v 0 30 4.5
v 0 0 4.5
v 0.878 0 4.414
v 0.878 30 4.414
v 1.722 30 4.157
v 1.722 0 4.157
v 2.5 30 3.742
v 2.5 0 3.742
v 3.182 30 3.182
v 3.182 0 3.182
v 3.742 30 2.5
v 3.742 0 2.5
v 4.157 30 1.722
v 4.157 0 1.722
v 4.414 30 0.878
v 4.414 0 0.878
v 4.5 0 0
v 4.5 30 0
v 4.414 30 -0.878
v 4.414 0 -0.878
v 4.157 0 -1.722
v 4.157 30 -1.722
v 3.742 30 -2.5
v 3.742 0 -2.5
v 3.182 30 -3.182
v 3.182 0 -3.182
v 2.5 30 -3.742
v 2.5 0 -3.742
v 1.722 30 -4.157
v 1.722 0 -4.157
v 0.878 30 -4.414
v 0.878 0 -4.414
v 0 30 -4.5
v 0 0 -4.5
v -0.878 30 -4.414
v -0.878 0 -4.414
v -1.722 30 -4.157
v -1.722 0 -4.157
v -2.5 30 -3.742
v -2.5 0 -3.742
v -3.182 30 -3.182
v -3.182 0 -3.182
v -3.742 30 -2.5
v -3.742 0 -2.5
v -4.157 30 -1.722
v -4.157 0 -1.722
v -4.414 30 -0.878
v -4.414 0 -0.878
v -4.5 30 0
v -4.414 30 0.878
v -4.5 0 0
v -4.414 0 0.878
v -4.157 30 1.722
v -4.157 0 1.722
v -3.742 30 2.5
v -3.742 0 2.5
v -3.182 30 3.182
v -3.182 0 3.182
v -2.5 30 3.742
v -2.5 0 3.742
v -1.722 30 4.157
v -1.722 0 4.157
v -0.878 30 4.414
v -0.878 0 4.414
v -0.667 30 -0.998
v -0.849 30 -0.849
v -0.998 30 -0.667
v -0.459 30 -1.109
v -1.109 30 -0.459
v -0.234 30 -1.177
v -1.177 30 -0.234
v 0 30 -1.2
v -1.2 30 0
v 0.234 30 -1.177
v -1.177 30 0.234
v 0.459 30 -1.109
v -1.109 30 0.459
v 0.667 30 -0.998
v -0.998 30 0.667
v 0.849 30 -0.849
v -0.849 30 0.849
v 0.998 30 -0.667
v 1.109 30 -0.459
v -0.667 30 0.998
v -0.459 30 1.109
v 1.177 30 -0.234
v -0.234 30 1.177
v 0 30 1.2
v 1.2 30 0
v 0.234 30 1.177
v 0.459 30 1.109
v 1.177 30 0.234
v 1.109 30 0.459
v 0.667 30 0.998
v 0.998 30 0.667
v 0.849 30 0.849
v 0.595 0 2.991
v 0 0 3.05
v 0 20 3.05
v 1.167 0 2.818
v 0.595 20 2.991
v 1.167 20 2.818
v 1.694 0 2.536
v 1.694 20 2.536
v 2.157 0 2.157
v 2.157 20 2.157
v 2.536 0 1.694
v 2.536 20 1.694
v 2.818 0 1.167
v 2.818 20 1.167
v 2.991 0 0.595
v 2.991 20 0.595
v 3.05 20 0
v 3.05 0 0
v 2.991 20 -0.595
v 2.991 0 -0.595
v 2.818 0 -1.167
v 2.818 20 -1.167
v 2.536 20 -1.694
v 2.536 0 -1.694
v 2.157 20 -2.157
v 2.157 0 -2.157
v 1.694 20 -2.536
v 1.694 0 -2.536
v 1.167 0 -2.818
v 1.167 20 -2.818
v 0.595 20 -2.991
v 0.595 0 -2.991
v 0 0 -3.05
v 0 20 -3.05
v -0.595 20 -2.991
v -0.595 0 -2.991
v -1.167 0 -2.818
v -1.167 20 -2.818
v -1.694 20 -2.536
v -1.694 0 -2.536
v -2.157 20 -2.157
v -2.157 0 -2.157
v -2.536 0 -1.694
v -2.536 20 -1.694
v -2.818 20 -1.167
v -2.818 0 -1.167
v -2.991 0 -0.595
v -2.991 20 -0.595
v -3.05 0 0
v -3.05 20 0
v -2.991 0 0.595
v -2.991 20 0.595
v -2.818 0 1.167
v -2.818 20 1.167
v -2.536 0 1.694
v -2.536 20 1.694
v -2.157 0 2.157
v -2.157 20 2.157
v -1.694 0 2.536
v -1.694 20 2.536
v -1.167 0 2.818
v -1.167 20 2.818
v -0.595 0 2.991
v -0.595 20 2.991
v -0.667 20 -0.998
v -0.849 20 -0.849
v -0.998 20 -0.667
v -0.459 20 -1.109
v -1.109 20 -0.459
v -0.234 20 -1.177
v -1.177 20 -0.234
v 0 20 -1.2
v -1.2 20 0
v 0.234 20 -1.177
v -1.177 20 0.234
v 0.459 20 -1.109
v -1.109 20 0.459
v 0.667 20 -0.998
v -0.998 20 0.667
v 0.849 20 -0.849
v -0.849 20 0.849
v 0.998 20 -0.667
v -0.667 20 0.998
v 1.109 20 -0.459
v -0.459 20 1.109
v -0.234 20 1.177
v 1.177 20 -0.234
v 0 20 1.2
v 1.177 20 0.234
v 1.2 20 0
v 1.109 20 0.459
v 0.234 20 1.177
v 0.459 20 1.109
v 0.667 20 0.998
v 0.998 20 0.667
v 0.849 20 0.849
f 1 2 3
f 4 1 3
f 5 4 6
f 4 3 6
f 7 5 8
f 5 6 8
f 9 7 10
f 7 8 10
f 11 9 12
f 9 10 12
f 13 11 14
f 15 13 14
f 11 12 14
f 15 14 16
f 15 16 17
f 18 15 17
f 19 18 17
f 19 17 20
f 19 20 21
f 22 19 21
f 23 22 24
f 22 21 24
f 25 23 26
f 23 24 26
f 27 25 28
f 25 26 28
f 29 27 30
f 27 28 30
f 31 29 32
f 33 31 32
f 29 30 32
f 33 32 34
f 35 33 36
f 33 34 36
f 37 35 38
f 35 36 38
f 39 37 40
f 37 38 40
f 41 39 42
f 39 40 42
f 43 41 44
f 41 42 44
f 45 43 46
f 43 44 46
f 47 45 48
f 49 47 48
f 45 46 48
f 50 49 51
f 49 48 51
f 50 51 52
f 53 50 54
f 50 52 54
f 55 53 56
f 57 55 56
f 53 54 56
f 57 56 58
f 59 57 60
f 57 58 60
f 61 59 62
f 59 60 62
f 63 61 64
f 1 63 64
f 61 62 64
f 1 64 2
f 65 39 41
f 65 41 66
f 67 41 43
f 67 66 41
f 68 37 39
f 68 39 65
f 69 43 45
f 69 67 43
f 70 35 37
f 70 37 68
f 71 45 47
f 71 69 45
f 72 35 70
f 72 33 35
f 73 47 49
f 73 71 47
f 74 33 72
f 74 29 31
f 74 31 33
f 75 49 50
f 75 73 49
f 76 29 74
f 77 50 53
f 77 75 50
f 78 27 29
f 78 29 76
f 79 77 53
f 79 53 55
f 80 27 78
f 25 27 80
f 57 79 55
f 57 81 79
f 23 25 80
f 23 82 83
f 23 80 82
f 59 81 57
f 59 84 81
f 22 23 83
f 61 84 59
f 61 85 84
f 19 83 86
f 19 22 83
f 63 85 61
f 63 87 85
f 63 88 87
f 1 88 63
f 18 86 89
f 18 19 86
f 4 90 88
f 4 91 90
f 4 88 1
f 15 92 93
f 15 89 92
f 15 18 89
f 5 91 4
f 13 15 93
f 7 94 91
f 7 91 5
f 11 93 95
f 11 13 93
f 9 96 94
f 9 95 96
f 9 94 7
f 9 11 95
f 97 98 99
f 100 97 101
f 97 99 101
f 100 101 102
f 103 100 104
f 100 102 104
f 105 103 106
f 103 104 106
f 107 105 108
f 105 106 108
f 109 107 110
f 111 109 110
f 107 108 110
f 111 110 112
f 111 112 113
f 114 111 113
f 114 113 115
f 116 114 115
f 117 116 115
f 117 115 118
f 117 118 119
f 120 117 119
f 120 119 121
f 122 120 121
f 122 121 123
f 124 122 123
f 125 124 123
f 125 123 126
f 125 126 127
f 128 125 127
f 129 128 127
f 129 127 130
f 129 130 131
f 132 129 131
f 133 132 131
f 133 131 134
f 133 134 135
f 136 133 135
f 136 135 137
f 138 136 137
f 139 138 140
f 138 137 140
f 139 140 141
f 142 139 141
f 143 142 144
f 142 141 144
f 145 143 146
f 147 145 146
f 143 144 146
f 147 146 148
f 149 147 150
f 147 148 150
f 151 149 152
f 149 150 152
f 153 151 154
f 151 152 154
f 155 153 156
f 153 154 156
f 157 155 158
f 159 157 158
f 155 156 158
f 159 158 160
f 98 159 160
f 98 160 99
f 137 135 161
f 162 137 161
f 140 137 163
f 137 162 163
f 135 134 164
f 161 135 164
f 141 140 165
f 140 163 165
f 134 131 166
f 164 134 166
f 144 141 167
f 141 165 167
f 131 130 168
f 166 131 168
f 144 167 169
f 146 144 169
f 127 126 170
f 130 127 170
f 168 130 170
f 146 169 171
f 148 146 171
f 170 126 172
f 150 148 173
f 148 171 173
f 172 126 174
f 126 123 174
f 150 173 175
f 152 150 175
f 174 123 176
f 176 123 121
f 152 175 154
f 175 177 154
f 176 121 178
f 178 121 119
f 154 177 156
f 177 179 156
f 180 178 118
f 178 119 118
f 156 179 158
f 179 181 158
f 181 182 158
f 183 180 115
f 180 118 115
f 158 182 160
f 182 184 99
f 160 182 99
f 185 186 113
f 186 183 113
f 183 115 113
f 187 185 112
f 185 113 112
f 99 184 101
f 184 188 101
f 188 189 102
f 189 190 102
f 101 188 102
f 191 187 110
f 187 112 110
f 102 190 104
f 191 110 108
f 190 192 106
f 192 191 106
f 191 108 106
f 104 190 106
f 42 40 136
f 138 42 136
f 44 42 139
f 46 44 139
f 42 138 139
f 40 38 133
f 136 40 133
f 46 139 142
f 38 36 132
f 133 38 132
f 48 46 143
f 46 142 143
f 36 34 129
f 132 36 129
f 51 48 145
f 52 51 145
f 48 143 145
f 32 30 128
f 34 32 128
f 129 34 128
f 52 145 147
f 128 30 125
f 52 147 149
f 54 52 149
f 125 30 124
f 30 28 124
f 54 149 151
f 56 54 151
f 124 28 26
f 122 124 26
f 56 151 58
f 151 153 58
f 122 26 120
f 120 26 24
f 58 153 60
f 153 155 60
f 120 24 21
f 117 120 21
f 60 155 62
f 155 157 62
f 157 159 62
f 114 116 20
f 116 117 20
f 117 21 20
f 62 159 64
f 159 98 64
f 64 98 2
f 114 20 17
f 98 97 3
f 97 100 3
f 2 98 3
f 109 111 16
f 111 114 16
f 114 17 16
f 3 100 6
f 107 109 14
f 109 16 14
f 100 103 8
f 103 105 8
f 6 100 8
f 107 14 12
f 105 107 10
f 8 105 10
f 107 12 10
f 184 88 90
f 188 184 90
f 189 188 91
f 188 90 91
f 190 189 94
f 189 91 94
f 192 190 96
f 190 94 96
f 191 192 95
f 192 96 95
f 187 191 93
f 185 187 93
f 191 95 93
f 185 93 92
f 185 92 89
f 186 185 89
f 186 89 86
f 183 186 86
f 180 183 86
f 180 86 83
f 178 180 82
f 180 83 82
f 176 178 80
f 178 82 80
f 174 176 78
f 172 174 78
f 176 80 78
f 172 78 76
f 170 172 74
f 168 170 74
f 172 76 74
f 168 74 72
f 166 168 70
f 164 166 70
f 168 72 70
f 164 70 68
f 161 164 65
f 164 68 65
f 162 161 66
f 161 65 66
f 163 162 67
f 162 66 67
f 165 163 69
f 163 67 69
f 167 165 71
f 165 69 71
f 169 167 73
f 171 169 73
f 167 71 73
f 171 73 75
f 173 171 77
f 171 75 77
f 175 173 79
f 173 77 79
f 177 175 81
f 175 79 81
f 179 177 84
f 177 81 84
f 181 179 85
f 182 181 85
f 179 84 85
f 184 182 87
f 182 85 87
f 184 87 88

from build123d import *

# Parameters (mm, degrees)
SKETCH1_R           = 4.5
BOSS_EXTRUDE1_DEPTH = 30
SKETCH2_R           = 3.05
CUT_EXTRUDE1_DEPTH  = 31.66757245
SKETCH3_R           = 3.05
BOSS_EXTRUDE2_DEPTH = 10
SKETCH4_R           = 1.2
CUT_EXTRUDE2_DEPTH  = 10


with BuildPart() as part:
    # Sketch1 → Boss-Extrude1 (new body)
    with BuildSketch(Plane(origin=(0, 0, 0), x_dir=(1, 0, 0), z_dir=(0, 1, 0))):
        with Locations(Location((0, 0, 0), (0, 0, 270))):
            Circle(SKETCH1_R)
    extrude(amount=BOSS_EXTRUDE1_DEPTH)

    # Sketch2 → Cut-Extrude1 (cut, through all)
    with BuildSketch(Plane(origin=(0, 30, 0), x_dir=(1, 0, 0), z_dir=(0, 1, 0))):
        with Locations(Location((0, 0, 0), (0, 0, 270))):
            Circle(SKETCH2_R)
    extrude(amount=-CUT_EXTRUDE1_DEPTH, mode=Mode.SUBTRACT)

    # Sketch3 → Boss-Extrude2 (add)
    with BuildSketch(Plane(origin=(0, 30, 0), x_dir=(1, 0, 0), z_dir=(0, 1, 0))):
        with Locations(Location((0, 0, 0), (0, 0, 270))):
            Circle(SKETCH3_R)
    extrude(amount=-BOSS_EXTRUDE2_DEPTH)

    # Sketch4 → Cut-Extrude2 (cut)
    with BuildSketch(Plane(origin=(0, 30, 0), x_dir=(1, 0, 0), z_dir=(0, 1, 0))):
        with Locations(Location((0, 0, 0), (0, 0, 270))):
            Circle(SKETCH4_R)
    extrude(amount=-CUT_EXTRUDE2_DEPTH, mode=Mode.SUBTRACT)


solid = part.part
